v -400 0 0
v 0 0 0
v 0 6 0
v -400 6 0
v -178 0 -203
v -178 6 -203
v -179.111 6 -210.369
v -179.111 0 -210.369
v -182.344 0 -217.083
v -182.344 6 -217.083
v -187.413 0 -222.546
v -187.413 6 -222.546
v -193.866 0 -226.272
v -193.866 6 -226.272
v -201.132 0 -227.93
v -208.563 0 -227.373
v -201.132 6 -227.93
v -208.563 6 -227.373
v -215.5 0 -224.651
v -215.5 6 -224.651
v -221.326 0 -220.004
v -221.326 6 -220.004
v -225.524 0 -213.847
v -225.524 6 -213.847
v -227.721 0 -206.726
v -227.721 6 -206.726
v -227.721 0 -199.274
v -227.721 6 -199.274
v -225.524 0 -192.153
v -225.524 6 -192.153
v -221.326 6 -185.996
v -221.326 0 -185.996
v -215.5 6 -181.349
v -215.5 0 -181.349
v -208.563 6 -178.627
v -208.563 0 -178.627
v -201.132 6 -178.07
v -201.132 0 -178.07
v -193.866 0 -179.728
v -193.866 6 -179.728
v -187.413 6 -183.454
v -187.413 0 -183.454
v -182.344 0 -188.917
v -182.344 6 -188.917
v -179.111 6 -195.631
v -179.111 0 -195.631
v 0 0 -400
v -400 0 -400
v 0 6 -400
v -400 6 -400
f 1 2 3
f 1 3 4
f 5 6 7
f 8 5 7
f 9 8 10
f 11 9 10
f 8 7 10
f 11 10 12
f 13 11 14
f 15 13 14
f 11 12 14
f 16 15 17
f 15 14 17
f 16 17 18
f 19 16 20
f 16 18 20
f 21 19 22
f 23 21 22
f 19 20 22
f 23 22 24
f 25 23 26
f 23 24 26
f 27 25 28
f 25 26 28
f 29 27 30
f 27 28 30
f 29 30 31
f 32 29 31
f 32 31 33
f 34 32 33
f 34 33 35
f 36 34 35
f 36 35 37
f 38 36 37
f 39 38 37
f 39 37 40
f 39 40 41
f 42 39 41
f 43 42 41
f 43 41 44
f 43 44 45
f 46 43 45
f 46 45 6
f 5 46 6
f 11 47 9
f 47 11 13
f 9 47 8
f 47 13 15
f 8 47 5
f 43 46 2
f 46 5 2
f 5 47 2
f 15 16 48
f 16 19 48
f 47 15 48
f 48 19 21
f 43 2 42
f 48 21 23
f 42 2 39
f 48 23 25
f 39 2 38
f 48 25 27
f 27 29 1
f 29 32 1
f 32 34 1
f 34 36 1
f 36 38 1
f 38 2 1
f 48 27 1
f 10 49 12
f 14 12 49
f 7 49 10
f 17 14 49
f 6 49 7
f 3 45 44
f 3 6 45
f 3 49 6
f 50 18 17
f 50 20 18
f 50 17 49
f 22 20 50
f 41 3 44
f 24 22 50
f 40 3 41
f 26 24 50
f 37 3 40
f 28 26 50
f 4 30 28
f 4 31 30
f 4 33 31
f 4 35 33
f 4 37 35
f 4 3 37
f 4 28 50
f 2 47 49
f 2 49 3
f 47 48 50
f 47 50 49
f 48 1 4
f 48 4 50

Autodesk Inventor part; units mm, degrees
ref_plane "YZ Plane" through (0, 0, 0) normal (1, 0, 0) x (0, 1, 0)
ref_plane "XZ Plane" through (0, 0, 0) normal (0, 1, 0) x (-1, 0, 0)
ref_plane "XY Plane" through (0, 0, 0) normal (0, 0, 1) x (1, 0, 0)
sketch "Эскиз1" plane through (0, 0, 0) normal (0, 1, 0) x (-1, 0, 0)
  line L0 (0, 0) -> (400, 0)
  line L1 (400, 0) -> (400, -400)
  line L2 (400, -400) -> (0, -400)
  line L3 (0, -400) -> (0, 0)
  dimension "d0" = 400
  dimension "d1" = 400
extrude "Выдавливание1" add sketch "Эскиз1" along normal blind 6
sketch "Эскиз2" plane through (0, 6, 0) normal (0, 1, 0) x (1, 0, 0)
  circle A0 centre (-203, 203) radius 25
  line L0 (-400, 0) -> (0, 0) projected
  line L1 (0, 0) -> (0, 400) projected
  dimension "d4" = 50
  dimension "d5" = 203
  dimension "d6" = 203
extrude "Выдавливание2" cut sketch "Эскиз2" against normal blind 6
sketch "Эскиз3" plane through (0, 6, 0) normal (0, 1, 0) x (1, 0, 0)
  line L0 (-400, 0) -> (0, 0) projected
  line L1 (0, 0) -> (-3, 0)
  line L2 (-3, 0) -> (-3, 3)
  line L3 (-3, 3) -> (0, 3)
  line L4 (0, 3) -> (0, 0)
  line L5 (0, 0) -> (0, 400) projected
  line L6 (0, 400) -> (-3, 400)
  line L7 (-3, 400) -> (-3, 397)
  line L8 (-3, 397) -> (0, 397)
  line L9 (0, 397) -> (0, 400)
  line L10 (-400, 400) -> (-400, 0) projected
  line L11 (-400, 400) -> (-397, 400)
  line L12 (-397, 400) -> (-397, 397)
  line L13 (-397, 397) -> (-400, 397)
  line L14 (-400, 397) -> (-400, 400)
  line L15 (-400, 0) -> (-397, 0)
  line L16 (-397, 0) -> (-397, 3)
  line L17 (-397, 3) -> (-400, 3)
  line L18 (-400, 3) -> (-400, 0)
  point P0 (0, 397)
  point P1 (-400, 3)
  point P2 (-397, 0)
  dimension "d9" = 3
  dimension "d10" = 3
  dimension "d11" = 3
  dimension "d12" = 3
  dimension "d13" = 3
  dimension "d14" = 3
  dimension "d15" = 3
properties part number "Днище"
